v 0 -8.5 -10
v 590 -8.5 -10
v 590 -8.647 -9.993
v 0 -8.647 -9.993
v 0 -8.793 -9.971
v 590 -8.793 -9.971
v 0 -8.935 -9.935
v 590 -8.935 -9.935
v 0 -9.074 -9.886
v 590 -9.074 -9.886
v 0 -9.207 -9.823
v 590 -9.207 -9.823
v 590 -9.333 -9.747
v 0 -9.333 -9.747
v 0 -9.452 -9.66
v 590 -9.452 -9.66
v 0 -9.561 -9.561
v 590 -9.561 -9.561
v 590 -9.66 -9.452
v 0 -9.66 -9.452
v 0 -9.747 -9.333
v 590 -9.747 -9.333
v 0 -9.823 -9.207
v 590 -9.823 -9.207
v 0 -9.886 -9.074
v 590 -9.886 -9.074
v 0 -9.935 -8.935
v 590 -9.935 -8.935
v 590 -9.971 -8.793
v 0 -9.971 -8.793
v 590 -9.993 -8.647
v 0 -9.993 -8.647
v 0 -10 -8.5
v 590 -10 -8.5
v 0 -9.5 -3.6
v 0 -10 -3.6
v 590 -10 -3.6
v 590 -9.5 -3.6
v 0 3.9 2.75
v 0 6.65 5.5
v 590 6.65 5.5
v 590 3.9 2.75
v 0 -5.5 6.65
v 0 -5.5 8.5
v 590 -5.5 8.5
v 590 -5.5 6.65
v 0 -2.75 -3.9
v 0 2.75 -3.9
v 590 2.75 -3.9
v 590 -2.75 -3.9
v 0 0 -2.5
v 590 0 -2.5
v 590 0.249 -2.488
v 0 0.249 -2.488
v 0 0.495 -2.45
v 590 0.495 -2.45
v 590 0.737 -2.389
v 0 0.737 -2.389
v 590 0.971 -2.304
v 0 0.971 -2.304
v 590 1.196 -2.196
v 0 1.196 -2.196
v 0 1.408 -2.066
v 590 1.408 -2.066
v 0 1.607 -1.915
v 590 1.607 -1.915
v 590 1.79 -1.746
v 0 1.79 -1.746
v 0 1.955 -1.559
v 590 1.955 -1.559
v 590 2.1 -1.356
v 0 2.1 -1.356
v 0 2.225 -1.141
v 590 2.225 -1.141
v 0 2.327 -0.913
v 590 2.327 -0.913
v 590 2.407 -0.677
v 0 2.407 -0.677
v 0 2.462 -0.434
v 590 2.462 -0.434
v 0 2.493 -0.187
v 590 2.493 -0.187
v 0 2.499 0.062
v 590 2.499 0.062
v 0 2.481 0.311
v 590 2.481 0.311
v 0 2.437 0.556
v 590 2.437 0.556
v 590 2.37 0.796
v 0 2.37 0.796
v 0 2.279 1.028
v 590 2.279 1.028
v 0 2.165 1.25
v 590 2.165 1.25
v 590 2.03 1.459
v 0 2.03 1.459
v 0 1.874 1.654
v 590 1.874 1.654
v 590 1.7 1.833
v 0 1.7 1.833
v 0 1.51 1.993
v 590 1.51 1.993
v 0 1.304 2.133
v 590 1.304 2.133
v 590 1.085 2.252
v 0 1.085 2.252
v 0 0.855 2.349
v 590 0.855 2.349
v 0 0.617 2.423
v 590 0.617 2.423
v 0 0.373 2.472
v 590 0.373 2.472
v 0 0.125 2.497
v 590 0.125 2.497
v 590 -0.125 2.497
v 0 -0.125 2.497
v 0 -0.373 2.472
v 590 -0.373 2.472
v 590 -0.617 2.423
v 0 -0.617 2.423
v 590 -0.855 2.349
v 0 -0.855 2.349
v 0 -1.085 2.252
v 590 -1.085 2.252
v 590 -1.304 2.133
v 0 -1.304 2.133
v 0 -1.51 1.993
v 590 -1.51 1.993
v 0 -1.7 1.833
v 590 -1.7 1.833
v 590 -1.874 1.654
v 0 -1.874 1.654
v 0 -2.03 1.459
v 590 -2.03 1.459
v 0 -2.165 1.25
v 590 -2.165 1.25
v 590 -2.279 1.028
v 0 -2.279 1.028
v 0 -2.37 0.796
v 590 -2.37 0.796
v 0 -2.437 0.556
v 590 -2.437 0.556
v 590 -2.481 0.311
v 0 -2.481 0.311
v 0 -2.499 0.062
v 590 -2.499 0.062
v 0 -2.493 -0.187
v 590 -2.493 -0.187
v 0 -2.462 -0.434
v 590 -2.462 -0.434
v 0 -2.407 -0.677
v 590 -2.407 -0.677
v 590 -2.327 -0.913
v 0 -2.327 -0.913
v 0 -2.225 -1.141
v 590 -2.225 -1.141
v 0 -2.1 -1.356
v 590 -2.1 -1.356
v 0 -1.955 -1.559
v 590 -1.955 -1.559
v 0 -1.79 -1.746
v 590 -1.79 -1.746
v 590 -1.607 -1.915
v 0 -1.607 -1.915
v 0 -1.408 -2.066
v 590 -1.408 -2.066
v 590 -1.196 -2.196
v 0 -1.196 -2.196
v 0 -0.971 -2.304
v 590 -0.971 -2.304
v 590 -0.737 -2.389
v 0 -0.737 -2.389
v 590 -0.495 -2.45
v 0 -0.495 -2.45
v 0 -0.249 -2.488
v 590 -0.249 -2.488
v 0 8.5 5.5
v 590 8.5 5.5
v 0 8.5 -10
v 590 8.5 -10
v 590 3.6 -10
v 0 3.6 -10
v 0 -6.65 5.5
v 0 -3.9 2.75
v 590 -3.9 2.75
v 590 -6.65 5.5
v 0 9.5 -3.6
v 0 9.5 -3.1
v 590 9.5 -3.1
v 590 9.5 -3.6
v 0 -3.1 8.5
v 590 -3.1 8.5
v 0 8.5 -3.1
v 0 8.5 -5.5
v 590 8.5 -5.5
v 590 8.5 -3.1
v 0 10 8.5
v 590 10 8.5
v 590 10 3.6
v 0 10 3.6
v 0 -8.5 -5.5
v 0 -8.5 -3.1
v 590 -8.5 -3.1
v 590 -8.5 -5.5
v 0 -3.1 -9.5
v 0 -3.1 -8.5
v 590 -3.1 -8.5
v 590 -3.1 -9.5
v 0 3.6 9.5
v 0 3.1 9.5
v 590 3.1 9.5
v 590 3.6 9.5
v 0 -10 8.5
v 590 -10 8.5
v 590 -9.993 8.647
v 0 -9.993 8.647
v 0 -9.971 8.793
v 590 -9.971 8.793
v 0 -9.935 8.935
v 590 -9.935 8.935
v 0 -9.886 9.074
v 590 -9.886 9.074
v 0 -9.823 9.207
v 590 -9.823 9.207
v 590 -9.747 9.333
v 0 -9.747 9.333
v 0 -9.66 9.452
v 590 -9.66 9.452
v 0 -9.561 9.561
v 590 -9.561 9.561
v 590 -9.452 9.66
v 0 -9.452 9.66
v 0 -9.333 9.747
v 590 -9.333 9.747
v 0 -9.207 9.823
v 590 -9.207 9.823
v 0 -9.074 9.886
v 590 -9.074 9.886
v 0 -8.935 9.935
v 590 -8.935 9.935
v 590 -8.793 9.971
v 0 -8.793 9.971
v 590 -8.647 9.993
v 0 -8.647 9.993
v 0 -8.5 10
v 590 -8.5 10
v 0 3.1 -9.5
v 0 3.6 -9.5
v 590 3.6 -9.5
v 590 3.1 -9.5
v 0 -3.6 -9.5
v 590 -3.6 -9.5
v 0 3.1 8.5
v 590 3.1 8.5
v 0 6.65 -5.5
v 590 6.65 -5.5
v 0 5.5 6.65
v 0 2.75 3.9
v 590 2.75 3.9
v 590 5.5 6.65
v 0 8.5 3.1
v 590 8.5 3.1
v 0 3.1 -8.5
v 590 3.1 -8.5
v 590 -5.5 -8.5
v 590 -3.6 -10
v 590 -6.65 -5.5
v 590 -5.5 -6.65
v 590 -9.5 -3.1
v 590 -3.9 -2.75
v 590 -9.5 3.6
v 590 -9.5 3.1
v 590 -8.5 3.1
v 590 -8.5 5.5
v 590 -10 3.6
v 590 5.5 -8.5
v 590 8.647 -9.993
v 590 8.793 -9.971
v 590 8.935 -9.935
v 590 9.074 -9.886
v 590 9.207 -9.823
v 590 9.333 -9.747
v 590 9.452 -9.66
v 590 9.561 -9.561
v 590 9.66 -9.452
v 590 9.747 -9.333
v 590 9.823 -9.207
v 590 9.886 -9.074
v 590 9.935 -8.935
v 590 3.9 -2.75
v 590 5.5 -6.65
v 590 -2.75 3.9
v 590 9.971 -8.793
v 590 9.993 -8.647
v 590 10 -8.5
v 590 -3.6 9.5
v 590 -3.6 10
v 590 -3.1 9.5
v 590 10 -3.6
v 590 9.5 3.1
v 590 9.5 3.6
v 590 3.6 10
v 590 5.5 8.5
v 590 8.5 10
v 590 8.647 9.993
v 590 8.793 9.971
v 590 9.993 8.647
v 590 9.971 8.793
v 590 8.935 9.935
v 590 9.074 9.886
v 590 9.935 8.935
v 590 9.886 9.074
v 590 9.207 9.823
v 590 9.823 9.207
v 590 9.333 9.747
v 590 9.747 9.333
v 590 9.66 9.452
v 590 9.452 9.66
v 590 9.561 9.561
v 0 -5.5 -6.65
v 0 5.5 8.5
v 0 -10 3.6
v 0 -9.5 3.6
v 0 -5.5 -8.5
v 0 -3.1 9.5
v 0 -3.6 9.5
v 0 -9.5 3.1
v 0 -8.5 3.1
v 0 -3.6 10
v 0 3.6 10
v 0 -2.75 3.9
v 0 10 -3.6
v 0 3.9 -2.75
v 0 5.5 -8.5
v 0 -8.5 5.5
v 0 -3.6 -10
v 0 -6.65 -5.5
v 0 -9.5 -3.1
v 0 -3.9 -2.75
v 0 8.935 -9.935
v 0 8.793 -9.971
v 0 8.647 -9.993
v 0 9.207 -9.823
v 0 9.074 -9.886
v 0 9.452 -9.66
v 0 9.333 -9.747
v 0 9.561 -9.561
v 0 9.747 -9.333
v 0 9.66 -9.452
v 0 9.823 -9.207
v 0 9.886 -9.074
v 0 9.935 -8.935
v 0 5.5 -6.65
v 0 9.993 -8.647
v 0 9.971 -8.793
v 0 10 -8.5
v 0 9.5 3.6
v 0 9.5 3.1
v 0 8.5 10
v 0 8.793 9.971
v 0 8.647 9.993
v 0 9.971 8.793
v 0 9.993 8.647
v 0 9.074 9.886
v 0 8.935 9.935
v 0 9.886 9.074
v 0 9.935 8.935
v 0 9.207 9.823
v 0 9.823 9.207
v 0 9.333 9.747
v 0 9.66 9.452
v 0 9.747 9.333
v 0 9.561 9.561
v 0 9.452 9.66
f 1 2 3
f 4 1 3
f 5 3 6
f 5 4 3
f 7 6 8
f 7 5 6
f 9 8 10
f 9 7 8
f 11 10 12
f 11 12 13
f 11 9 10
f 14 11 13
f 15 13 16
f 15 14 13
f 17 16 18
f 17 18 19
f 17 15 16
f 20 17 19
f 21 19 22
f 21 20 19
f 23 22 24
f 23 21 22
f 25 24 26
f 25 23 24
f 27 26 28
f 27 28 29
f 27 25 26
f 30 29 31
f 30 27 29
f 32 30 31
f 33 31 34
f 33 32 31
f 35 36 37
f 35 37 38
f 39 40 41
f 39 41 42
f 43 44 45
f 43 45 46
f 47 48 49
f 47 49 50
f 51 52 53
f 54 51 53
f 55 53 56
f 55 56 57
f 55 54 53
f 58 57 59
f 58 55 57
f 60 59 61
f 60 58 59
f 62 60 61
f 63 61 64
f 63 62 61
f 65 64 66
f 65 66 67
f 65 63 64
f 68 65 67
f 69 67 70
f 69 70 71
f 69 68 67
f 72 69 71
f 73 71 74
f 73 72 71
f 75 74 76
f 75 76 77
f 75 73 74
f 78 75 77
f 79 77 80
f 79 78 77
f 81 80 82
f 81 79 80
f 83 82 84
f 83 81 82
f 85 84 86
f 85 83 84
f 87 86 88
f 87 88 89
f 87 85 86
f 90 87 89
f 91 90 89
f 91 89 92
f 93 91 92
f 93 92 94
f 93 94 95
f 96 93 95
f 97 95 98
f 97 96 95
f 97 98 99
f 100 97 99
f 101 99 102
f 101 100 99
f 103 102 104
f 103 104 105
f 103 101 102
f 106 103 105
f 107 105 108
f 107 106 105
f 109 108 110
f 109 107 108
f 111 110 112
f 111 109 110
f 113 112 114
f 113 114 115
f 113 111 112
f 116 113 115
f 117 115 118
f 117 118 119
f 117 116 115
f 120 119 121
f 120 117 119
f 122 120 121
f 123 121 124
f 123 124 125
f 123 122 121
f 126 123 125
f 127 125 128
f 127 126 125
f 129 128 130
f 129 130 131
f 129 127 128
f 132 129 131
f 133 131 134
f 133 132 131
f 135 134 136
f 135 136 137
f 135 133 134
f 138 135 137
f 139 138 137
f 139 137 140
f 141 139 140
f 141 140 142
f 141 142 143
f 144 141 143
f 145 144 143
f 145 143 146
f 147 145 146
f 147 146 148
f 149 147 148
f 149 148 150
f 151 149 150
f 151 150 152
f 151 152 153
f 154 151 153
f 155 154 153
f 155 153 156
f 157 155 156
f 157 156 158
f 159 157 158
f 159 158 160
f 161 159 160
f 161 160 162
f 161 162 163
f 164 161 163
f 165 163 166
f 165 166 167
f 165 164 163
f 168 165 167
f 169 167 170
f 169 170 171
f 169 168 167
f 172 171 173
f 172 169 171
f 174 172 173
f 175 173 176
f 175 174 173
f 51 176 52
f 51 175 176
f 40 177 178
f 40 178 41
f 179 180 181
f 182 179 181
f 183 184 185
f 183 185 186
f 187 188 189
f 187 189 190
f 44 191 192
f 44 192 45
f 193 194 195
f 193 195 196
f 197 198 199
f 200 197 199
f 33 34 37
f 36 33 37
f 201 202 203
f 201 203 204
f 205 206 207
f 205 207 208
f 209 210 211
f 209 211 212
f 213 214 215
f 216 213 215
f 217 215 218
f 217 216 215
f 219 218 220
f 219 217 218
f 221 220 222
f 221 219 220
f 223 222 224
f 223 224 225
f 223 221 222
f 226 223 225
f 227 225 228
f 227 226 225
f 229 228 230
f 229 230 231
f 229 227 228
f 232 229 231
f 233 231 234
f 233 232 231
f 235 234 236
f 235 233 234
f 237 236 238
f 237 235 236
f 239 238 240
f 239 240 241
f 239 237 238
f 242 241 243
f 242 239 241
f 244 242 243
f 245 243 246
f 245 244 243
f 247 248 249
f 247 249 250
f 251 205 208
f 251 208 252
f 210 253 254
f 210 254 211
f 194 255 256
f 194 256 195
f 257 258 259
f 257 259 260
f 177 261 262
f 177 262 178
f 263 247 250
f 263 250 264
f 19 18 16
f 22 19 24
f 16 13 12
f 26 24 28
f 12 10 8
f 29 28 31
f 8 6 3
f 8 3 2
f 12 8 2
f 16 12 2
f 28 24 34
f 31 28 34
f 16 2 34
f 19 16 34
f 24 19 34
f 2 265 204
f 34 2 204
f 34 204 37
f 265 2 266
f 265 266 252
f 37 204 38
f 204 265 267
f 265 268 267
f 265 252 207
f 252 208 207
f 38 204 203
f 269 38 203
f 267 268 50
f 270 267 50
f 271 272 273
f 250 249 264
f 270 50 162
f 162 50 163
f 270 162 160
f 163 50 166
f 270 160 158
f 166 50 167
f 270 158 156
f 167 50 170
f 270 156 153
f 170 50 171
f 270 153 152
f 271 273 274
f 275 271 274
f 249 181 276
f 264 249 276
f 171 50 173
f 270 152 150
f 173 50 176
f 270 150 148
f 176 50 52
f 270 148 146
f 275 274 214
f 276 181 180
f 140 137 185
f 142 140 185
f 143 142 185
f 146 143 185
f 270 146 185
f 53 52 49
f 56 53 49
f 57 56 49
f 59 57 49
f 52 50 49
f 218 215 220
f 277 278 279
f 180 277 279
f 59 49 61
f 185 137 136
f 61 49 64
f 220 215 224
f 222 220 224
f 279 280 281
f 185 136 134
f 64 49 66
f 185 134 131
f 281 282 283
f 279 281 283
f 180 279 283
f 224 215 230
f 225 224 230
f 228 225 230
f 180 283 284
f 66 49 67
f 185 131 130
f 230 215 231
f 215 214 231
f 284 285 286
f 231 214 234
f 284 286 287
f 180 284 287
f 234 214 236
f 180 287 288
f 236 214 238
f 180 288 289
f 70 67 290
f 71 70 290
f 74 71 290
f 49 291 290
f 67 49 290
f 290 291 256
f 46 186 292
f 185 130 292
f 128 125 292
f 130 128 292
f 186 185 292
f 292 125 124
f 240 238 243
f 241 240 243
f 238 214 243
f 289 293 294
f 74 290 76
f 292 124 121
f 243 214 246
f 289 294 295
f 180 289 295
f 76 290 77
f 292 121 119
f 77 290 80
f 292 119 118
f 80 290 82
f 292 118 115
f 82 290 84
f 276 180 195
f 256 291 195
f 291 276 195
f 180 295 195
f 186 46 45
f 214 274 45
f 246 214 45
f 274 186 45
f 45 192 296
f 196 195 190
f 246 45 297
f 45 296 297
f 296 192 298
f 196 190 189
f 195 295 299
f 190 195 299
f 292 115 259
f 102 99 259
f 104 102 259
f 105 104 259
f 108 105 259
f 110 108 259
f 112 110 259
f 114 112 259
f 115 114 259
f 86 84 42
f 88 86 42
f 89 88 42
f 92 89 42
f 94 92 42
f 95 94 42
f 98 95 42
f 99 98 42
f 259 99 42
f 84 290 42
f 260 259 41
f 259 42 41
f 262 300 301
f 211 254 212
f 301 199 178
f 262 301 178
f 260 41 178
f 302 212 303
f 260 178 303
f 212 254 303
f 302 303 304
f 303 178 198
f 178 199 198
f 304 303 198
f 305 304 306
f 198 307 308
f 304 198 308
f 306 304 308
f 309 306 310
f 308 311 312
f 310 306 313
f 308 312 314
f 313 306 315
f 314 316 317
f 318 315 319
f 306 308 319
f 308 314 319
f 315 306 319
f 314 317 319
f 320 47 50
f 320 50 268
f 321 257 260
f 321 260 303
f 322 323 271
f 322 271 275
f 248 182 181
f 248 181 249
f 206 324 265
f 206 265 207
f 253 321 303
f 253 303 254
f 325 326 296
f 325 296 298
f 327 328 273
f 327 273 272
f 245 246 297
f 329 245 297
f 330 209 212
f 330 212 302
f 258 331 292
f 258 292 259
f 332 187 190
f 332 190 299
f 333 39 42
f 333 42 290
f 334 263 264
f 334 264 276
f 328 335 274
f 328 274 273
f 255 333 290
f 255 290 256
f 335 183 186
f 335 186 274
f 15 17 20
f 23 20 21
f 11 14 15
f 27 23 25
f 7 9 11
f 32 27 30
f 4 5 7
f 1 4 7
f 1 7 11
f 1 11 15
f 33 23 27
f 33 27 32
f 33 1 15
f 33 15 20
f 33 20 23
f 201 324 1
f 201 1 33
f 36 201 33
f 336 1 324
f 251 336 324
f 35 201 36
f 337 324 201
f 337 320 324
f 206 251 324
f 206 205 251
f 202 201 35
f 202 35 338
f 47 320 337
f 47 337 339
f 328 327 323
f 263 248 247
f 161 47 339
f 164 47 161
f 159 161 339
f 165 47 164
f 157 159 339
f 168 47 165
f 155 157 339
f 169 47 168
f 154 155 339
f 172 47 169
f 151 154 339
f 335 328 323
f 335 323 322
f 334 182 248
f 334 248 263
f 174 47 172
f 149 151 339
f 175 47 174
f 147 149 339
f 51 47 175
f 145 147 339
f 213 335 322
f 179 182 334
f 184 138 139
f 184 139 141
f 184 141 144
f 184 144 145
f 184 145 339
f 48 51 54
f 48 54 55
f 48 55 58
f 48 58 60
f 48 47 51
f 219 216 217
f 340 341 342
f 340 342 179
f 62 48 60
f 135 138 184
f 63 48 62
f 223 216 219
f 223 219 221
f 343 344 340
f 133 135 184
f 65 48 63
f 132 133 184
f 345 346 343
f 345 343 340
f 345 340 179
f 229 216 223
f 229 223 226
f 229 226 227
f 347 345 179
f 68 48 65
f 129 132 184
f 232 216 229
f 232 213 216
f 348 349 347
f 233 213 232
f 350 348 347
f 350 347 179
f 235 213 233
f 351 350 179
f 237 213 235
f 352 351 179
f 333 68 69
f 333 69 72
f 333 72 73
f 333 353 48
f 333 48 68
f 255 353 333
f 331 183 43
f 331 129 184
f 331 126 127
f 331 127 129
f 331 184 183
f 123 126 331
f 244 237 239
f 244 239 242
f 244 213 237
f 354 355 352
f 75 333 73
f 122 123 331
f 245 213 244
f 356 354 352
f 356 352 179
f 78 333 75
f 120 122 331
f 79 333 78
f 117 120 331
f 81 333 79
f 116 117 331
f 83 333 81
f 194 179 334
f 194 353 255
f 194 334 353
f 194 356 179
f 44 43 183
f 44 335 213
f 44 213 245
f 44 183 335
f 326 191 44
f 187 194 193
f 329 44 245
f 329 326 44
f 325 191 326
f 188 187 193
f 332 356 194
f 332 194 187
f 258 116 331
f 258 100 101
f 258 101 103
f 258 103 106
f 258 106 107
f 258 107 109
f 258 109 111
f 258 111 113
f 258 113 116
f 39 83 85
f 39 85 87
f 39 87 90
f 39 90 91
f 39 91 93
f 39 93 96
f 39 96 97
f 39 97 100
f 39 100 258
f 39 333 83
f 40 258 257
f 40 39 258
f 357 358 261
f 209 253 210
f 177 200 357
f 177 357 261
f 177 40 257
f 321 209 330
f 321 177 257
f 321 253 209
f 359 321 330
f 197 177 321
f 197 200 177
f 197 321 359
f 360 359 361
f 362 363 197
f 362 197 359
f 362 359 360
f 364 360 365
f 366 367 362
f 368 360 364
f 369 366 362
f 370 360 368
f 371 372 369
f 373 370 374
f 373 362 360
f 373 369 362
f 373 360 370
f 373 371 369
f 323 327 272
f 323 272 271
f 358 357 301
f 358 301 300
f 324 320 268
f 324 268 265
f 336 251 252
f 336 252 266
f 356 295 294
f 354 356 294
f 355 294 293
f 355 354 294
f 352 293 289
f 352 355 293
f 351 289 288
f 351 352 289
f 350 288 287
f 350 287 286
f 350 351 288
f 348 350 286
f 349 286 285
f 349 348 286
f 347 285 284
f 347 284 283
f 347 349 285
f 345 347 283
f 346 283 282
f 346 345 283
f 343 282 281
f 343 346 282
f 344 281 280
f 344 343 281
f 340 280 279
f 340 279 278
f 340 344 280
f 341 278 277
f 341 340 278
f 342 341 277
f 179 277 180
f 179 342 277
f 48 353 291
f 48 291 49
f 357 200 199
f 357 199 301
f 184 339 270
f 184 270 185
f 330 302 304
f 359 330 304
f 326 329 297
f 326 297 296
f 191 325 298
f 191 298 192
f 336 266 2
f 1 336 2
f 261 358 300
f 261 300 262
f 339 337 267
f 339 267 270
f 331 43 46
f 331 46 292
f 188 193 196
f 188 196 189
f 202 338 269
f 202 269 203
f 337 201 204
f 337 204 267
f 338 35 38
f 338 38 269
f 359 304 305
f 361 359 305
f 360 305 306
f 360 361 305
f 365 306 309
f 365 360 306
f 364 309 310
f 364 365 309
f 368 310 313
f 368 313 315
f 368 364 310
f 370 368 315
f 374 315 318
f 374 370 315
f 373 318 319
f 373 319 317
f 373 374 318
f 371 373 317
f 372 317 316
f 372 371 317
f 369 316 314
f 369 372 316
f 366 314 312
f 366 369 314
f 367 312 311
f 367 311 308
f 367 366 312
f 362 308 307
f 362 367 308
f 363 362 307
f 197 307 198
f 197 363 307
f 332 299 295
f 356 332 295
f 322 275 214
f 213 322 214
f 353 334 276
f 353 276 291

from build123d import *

# Parameters (mm, degrees)
SKETCH1_R                = 2.5
F_20_X_20_X_R1_5_1_DEPTH = 590


with BuildPart() as part:
    # Sketch1 → 铝型材 20 X 20 X R1.5(1) (new body)
    with BuildSketch(Plane(origin=(0, 0, 0), x_dir=(0, 0, -1), z_dir=(1, 0, 0))):
        with BuildLine():
            Line((-3.6, 10), (-3.6, 9.5))
            Line((-3.6, 9.5), (-3.1, 9.5))
            Line((-3.1, 9.5), (-3.1, 8.5))
            Line((-3.1, 8.5), (-5.5, 8.5))
            Line((-5.5, 8.5), (-5.5, 6.65))
            Line((-5.5, 6.65), (-2.75, 3.9))
            Line((-2.75, 3.9), (2.75, 3.9))
            Line((2.75, 3.9), (5.5, 6.65))
            Line((5.5, 6.65), (5.5, 8.5))
            Line((5.5, 8.5), (3.1, 8.5))
            Line((3.1, 8.5), (3.1, 9.5))
            Line((3.1, 9.5), (3.6, 9.5))
            Line((3.6, 9.5), (3.6, 10))
            Line((3.6, 10), (8.5, 10))
            ThreePointArc((8.5, 10), (9.560660172, 9.560660172), (10, 8.5))
            Line((10, 8.5), (10, 3.6))
            Line((10, 3.6), (9.5, 3.6))
            Line((9.5, 3.6), (9.5, 3.1))
            Line((9.5, 3.1), (8.5, 3.1))
            Line((8.5, 3.1), (8.5, 5.5))
            Line((8.5, 5.5), (6.65, 5.5))
            Line((6.65, 5.5), (3.9, 2.75))
            Line((3.9, 2.75), (3.9, -2.75))
            Line((3.9, -2.75), (6.65, -5.5))
            Line((6.65, -5.5), (8.5, -5.5))
            Line((8.5, -5.5), (8.5, -3.1))
            Line((8.5, -3.1), (9.5, -3.1))
            Line((9.5, -3.1), (9.5, -3.6))
            Line((9.5, -3.6), (10, -3.6))
            Line((10, -3.6), (10, -8.5))
            ThreePointArc((10, -8.5), (9.560660172, -9.560660172), (8.5, -10))
            Line((8.5, -10), (3.6, -10))
            Line((3.6, -10), (3.6, -9.5))
            Line((3.6, -9.5), (3.1, -9.5))
            Line((3.1, -9.5), (3.1, -8.5))
            Line((3.1, -8.5), (5.5, -8.5))
            Line((5.5, -8.5), (5.5, -6.65))
            Line((5.5, -6.65), (2.75, -3.9))
            Line((2.75, -3.9), (-2.75, -3.9))
            Line((-2.75, -3.9), (-5.5, -6.65))
            Line((-5.5, -6.65), (-5.5, -8.5))
            Line((-5.5, -8.5), (-3.1, -8.5))
            Line((-3.1, -8.5), (-3.1, -9.5))
            Line((-3.1, -9.5), (-3.6, -9.5))
            Line((-3.6, -9.5), (-3.6, -10))
            Line((-3.6, -10), (-8.5, -10))
            ThreePointArc((-8.5, -10), (-9.560660172, -9.560660172), (-10, -8.5))
            Line((-10, -8.5), (-10, -3.6))
            Line((-10, -3.6), (-9.5, -3.6))
            Line((-9.5, -3.6), (-9.5, -3.1))
            Line((-9.5, -3.1), (-8.5, -3.1))
            Line((-8.5, -3.1), (-8.5, -5.5))
            Line((-8.5, -5.5), (-6.65, -5.5))
            Line((-6.65, -5.5), (-3.9, -2.75))
            Line((-3.9, -2.75), (-3.9, 2.75))
            Line((-3.9, 2.75), (-6.65, 5.5))
            Line((-6.65, 5.5), (-8.5, 5.5))
            Line((-8.5, 5.5), (-8.5, 3.1))
            Line((-8.5, 3.1), (-9.5, 3.1))
            Line((-9.5, 3.1), (-9.5, 3.6))
            Line((-9.5, 3.6), (-10, 3.6))
            Line((-10, 3.6), (-10, 8.5))
            ThreePointArc((-10, 8.5), (-9.560660172, 9.560660172), (-8.5, 10))
            Line((-8.5, 10), (-3.6, 10))
        make_face()
        Circle(SKETCH1_R, mode=Mode.SUBTRACT)
    extrude(amount=F_20_X_20_X_R1_5_1_DEPTH)


solid = part.part
